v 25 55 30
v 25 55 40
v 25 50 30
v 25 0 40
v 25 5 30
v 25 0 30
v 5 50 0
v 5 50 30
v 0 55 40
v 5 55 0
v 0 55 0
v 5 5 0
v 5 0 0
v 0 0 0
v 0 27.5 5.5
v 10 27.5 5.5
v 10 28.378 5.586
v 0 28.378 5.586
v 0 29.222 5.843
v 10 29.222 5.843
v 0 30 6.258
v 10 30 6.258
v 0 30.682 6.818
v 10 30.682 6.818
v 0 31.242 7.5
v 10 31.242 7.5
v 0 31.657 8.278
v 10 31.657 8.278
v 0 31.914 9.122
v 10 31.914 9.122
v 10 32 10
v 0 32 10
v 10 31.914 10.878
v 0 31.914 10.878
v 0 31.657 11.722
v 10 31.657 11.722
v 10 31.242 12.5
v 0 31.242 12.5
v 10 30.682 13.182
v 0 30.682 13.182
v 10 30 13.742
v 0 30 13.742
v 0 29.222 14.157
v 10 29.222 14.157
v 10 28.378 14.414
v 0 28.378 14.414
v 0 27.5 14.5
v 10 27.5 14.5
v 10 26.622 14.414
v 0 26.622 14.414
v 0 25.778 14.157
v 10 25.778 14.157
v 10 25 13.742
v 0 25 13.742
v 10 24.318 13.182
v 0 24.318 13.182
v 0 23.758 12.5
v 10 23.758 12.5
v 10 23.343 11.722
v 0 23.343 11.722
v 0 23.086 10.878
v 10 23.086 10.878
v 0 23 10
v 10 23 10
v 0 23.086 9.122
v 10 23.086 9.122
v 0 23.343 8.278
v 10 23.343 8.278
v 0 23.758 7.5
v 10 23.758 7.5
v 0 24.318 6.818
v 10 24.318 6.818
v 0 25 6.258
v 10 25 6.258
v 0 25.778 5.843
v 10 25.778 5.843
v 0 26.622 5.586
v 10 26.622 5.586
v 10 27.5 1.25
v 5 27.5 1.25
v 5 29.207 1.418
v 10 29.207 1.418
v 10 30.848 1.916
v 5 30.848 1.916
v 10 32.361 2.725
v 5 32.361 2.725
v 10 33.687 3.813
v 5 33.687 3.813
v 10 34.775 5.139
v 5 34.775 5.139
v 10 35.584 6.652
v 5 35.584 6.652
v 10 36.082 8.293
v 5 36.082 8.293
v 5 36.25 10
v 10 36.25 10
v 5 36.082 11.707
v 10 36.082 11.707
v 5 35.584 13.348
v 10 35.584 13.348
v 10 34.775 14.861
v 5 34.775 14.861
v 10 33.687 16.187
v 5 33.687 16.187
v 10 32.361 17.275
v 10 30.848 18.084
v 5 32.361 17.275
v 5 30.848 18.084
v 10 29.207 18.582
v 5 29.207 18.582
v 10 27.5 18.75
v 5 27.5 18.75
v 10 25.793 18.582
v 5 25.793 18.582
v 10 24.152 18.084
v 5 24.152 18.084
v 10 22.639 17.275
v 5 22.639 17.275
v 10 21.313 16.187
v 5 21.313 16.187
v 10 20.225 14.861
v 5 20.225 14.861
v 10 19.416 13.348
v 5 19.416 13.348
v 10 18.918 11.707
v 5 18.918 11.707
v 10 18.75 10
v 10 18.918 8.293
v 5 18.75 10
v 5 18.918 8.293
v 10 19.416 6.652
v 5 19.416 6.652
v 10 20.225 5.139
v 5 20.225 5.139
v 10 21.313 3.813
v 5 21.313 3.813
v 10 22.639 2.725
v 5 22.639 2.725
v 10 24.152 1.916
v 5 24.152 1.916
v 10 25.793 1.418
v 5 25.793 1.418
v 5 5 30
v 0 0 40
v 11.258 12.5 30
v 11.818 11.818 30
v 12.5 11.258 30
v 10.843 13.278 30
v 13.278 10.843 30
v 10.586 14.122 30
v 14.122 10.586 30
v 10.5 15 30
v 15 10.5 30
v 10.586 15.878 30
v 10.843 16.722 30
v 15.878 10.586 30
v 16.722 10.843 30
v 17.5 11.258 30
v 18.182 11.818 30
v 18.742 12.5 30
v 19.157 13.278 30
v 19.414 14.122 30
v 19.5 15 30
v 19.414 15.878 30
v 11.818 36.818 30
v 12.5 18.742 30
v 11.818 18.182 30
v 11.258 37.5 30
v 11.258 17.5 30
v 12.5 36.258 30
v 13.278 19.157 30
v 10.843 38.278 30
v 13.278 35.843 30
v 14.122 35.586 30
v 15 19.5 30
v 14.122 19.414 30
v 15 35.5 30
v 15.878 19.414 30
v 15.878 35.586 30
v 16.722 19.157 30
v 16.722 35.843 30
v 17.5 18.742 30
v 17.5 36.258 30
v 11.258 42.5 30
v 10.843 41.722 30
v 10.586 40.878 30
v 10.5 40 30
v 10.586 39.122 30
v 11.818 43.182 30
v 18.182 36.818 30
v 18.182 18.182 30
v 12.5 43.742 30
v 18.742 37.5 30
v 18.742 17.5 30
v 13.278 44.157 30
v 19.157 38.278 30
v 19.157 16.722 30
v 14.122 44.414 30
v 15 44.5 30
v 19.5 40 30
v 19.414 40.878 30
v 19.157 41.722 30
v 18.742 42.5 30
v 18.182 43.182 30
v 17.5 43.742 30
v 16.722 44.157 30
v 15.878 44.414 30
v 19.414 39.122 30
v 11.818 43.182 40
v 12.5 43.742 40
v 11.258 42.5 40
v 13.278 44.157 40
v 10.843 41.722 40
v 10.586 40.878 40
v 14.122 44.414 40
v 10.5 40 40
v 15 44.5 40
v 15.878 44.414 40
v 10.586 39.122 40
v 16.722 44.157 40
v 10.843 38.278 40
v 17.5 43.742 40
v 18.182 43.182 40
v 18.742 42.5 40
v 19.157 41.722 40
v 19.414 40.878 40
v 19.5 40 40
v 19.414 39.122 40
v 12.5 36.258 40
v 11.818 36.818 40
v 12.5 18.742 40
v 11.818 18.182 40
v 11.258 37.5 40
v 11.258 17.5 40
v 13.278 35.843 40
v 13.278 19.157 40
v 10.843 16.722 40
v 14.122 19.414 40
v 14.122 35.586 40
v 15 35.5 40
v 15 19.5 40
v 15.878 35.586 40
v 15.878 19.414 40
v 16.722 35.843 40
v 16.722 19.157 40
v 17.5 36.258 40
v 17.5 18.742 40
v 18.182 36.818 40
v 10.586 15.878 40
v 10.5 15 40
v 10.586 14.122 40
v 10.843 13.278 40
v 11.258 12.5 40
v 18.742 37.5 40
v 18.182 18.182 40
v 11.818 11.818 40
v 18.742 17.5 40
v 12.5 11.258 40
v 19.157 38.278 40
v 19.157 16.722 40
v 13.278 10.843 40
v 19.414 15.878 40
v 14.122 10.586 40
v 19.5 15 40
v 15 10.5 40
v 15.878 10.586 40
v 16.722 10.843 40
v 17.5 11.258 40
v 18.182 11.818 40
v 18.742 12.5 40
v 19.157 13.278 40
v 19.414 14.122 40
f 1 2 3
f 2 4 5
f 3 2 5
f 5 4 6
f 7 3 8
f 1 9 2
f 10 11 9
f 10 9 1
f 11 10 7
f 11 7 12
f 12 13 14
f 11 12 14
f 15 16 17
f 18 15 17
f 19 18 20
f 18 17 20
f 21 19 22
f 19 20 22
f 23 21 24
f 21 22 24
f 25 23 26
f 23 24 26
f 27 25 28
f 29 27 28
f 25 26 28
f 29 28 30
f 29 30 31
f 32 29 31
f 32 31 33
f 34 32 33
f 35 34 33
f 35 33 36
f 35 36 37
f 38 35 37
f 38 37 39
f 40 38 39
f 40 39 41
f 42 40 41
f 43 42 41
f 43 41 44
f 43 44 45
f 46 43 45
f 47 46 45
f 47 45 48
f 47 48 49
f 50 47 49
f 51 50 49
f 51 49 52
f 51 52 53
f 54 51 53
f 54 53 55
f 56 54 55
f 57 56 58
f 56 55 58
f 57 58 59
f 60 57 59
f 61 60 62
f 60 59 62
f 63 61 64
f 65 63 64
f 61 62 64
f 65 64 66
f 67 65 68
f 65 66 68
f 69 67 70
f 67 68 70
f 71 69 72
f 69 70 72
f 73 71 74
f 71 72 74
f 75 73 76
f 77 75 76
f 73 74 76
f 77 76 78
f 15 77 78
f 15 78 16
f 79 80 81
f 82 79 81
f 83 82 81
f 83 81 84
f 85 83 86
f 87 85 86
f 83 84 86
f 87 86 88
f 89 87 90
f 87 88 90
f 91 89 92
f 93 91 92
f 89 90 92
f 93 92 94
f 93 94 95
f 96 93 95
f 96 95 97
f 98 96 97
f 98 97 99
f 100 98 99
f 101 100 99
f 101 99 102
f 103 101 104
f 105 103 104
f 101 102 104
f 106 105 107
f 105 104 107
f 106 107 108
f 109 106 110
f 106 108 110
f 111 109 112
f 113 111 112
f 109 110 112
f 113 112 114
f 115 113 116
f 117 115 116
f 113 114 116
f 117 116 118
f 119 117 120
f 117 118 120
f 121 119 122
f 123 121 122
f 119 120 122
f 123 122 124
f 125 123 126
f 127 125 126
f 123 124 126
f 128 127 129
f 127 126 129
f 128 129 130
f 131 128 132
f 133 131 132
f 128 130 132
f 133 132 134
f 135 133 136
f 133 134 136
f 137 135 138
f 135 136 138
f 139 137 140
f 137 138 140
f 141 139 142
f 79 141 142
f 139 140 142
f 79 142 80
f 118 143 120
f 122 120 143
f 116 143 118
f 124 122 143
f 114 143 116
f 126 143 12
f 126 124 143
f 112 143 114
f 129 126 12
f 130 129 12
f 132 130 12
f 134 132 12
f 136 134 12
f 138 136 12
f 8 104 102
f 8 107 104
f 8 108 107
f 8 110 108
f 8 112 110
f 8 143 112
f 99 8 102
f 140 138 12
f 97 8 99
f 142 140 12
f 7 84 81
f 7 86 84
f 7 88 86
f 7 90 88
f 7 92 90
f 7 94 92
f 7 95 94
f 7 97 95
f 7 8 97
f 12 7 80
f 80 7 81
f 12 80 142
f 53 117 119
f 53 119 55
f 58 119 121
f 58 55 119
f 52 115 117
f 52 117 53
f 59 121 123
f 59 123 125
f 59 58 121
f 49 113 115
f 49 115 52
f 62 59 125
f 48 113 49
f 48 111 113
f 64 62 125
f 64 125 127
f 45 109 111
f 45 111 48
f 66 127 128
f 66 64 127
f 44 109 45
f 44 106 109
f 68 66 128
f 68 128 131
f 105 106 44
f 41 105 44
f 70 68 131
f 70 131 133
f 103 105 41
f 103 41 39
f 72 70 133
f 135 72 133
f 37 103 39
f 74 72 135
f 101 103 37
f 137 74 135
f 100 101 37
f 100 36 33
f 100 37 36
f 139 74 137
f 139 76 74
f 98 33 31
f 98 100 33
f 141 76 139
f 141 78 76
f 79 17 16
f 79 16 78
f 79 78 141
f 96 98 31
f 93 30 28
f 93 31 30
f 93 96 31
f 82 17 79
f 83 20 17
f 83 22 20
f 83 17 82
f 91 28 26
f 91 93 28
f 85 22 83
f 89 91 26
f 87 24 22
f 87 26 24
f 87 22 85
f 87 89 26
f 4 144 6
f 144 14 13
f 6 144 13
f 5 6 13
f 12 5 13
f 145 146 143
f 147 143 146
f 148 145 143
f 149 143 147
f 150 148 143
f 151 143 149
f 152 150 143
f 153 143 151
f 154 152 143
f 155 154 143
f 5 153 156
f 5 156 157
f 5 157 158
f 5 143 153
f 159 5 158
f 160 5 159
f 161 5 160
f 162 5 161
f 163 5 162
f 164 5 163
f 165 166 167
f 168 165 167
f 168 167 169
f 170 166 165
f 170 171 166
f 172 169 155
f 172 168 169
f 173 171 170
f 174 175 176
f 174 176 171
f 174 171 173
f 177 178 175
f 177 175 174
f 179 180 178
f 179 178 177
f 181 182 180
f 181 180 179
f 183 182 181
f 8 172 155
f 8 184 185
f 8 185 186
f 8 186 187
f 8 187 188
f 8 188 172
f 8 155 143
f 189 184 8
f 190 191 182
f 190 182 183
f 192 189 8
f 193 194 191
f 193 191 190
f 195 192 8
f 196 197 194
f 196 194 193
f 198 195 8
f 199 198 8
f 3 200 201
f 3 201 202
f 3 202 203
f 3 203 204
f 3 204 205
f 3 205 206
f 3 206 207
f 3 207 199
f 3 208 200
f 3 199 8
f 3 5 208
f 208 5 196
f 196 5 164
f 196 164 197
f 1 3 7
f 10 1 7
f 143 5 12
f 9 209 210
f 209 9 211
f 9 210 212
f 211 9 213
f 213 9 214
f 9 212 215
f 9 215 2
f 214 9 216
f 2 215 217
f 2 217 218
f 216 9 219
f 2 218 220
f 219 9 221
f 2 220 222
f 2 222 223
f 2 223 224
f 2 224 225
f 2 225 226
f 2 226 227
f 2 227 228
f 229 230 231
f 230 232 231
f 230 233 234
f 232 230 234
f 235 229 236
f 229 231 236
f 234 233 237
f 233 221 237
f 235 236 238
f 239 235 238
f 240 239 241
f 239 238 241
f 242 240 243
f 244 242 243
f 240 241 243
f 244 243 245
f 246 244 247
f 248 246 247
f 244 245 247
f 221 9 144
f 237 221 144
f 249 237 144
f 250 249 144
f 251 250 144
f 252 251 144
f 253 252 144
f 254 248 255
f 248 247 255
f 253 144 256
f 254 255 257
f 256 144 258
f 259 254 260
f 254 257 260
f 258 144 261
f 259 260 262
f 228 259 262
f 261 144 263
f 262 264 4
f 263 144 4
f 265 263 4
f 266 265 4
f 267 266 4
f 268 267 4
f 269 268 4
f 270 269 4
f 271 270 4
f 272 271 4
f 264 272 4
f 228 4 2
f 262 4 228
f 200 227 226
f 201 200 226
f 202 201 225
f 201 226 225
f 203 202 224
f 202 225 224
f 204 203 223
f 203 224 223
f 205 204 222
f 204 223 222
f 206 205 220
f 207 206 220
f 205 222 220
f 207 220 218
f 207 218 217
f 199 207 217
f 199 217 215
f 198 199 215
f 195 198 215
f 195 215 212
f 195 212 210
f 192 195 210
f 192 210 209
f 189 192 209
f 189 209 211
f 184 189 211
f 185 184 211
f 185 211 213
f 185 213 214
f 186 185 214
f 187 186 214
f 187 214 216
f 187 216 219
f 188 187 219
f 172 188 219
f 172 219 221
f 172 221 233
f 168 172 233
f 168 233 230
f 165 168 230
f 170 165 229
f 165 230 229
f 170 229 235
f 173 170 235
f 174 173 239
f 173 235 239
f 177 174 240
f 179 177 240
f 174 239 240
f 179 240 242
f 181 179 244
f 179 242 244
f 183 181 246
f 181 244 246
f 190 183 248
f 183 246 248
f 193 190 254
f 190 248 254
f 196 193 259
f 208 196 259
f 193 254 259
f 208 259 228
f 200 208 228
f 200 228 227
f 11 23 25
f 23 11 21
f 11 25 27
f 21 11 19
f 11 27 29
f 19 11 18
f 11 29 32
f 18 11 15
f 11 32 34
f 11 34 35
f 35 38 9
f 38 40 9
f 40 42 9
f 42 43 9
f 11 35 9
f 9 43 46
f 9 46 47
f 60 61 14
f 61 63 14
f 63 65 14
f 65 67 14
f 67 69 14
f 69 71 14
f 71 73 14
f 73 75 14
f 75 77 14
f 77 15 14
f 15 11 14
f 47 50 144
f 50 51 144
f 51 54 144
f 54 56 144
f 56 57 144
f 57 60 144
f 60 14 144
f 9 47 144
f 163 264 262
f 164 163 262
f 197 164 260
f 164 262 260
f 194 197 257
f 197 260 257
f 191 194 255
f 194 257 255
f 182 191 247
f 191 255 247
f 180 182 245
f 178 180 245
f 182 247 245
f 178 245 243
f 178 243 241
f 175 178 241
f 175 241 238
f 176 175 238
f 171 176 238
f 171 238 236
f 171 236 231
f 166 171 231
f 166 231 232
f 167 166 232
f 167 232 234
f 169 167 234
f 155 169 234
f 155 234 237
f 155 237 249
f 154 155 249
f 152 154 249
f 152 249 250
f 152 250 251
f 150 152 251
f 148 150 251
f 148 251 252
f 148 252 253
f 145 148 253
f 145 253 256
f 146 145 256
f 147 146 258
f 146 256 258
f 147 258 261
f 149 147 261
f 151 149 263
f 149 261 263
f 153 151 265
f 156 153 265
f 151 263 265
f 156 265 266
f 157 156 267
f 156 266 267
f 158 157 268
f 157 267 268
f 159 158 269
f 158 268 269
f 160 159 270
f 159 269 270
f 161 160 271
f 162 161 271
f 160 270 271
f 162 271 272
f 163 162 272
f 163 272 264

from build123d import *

# Parameters (mm, degrees)
BOSS_EXTRUDE1_DEPTH = 55
SKETCH7_W           = 30
SKETCH7_H           = 45
CUT_EXTRUDE5_DEPTH  = 20
CUT_EXTRUDE4_REACH  = 74.457
SKETCH6_R           = 4.5
SKETCH8_R           = 8.75
BOSS_EXTRUDE2_DEPTH = 5
CUT_EXTRUDE6_REACH  = 71.642
SKETCH9_R           = 4.5


with BuildPart() as part:
    # Sketch1 → Boss-Extrude1 (new body)
    with BuildSketch(Plane(origin=(0, 0, 0), x_dir=(1, 0, 0), z_dir=(0, 1, 0))):
        Polygon((0, 0), (0, -40), (25, -40), (25, -30), (5, 0), align=None)
    extrude(amount=BOSS_EXTRUDE1_DEPTH)

    # Sketch7 → Cut-Extrude5 (cut)
    with BuildSketch(Plane(origin=(25, 0, 0), x_dir=(0, 0, -1), z_dir=(1, 0, 0))):
        with Locations((-15, 27.5)):
            Rectangle(SKETCH7_W, SKETCH7_H)
    extrude(amount=-CUT_EXTRUDE5_DEPTH, mode=Mode.SUBTRACT)

    # Sketch6 → Cut-Extrude4 (cut, up to next)
    with BuildSketch(Plane.XY.offset(40), mode=Mode.PRIVATE) as cut_extrude4_sk1:
        with Locations((15, 40)):
            Circle(SKETCH6_R)
    cut_extrude4_tool1 = extrude(cut_extrude4_sk1.sketch, amount=-CUT_EXTRUDE4_REACH, mode=Mode.PRIVATE) & part.part
    # Sketch6 → Cut-Extrude4 (cut, up to next)
    with BuildSketch(Plane.XY.offset(40), mode=Mode.PRIVATE) as cut_extrude4_sk2:
        with Locations((15, 15)):
            Circle(SKETCH6_R)
    cut_extrude4_tool2 = extrude(cut_extrude4_sk2.sketch, amount=-CUT_EXTRUDE4_REACH, mode=Mode.PRIVATE) & part.part
    add(cut_extrude4_tool1.solids().sort_by_distance((15, 40, 40))[0], mode=Mode.SUBTRACT)
    add(cut_extrude4_tool2.solids().sort_by_distance((15, 15, 40))[0], mode=Mode.SUBTRACT)

    # Sketch8 → Boss-Extrude2 (add)
    with BuildSketch(Plane(origin=(5, 0, 0), x_dir=(0, 0, -1), z_dir=(1, 0, 0))):
        with Locations((-10, 27.5)):
            Circle(SKETCH8_R)
    extrude(amount=BOSS_EXTRUDE2_DEPTH)

    # Sketch9 → Cut-Extrude6 (cut, up to next)
    with BuildSketch(Plane(origin=(10, 0, 0), x_dir=(0, 0, -1), z_dir=(1, 0, 0)), mode=Mode.PRIVATE) as cut_extrude6_sk1:
        with Locations((-10, 27.5)):
            Circle(SKETCH9_R)
    cut_extrude6_tool1 = extrude(cut_extrude6_sk1.sketch, amount=-CUT_EXTRUDE6_REACH, mode=Mode.PRIVATE) & part.part
    add(cut_extrude6_tool1.solids().sort_by_distance((10, 27.5, 10))[0], mode=Mode.SUBTRACT)


solid = part.part
